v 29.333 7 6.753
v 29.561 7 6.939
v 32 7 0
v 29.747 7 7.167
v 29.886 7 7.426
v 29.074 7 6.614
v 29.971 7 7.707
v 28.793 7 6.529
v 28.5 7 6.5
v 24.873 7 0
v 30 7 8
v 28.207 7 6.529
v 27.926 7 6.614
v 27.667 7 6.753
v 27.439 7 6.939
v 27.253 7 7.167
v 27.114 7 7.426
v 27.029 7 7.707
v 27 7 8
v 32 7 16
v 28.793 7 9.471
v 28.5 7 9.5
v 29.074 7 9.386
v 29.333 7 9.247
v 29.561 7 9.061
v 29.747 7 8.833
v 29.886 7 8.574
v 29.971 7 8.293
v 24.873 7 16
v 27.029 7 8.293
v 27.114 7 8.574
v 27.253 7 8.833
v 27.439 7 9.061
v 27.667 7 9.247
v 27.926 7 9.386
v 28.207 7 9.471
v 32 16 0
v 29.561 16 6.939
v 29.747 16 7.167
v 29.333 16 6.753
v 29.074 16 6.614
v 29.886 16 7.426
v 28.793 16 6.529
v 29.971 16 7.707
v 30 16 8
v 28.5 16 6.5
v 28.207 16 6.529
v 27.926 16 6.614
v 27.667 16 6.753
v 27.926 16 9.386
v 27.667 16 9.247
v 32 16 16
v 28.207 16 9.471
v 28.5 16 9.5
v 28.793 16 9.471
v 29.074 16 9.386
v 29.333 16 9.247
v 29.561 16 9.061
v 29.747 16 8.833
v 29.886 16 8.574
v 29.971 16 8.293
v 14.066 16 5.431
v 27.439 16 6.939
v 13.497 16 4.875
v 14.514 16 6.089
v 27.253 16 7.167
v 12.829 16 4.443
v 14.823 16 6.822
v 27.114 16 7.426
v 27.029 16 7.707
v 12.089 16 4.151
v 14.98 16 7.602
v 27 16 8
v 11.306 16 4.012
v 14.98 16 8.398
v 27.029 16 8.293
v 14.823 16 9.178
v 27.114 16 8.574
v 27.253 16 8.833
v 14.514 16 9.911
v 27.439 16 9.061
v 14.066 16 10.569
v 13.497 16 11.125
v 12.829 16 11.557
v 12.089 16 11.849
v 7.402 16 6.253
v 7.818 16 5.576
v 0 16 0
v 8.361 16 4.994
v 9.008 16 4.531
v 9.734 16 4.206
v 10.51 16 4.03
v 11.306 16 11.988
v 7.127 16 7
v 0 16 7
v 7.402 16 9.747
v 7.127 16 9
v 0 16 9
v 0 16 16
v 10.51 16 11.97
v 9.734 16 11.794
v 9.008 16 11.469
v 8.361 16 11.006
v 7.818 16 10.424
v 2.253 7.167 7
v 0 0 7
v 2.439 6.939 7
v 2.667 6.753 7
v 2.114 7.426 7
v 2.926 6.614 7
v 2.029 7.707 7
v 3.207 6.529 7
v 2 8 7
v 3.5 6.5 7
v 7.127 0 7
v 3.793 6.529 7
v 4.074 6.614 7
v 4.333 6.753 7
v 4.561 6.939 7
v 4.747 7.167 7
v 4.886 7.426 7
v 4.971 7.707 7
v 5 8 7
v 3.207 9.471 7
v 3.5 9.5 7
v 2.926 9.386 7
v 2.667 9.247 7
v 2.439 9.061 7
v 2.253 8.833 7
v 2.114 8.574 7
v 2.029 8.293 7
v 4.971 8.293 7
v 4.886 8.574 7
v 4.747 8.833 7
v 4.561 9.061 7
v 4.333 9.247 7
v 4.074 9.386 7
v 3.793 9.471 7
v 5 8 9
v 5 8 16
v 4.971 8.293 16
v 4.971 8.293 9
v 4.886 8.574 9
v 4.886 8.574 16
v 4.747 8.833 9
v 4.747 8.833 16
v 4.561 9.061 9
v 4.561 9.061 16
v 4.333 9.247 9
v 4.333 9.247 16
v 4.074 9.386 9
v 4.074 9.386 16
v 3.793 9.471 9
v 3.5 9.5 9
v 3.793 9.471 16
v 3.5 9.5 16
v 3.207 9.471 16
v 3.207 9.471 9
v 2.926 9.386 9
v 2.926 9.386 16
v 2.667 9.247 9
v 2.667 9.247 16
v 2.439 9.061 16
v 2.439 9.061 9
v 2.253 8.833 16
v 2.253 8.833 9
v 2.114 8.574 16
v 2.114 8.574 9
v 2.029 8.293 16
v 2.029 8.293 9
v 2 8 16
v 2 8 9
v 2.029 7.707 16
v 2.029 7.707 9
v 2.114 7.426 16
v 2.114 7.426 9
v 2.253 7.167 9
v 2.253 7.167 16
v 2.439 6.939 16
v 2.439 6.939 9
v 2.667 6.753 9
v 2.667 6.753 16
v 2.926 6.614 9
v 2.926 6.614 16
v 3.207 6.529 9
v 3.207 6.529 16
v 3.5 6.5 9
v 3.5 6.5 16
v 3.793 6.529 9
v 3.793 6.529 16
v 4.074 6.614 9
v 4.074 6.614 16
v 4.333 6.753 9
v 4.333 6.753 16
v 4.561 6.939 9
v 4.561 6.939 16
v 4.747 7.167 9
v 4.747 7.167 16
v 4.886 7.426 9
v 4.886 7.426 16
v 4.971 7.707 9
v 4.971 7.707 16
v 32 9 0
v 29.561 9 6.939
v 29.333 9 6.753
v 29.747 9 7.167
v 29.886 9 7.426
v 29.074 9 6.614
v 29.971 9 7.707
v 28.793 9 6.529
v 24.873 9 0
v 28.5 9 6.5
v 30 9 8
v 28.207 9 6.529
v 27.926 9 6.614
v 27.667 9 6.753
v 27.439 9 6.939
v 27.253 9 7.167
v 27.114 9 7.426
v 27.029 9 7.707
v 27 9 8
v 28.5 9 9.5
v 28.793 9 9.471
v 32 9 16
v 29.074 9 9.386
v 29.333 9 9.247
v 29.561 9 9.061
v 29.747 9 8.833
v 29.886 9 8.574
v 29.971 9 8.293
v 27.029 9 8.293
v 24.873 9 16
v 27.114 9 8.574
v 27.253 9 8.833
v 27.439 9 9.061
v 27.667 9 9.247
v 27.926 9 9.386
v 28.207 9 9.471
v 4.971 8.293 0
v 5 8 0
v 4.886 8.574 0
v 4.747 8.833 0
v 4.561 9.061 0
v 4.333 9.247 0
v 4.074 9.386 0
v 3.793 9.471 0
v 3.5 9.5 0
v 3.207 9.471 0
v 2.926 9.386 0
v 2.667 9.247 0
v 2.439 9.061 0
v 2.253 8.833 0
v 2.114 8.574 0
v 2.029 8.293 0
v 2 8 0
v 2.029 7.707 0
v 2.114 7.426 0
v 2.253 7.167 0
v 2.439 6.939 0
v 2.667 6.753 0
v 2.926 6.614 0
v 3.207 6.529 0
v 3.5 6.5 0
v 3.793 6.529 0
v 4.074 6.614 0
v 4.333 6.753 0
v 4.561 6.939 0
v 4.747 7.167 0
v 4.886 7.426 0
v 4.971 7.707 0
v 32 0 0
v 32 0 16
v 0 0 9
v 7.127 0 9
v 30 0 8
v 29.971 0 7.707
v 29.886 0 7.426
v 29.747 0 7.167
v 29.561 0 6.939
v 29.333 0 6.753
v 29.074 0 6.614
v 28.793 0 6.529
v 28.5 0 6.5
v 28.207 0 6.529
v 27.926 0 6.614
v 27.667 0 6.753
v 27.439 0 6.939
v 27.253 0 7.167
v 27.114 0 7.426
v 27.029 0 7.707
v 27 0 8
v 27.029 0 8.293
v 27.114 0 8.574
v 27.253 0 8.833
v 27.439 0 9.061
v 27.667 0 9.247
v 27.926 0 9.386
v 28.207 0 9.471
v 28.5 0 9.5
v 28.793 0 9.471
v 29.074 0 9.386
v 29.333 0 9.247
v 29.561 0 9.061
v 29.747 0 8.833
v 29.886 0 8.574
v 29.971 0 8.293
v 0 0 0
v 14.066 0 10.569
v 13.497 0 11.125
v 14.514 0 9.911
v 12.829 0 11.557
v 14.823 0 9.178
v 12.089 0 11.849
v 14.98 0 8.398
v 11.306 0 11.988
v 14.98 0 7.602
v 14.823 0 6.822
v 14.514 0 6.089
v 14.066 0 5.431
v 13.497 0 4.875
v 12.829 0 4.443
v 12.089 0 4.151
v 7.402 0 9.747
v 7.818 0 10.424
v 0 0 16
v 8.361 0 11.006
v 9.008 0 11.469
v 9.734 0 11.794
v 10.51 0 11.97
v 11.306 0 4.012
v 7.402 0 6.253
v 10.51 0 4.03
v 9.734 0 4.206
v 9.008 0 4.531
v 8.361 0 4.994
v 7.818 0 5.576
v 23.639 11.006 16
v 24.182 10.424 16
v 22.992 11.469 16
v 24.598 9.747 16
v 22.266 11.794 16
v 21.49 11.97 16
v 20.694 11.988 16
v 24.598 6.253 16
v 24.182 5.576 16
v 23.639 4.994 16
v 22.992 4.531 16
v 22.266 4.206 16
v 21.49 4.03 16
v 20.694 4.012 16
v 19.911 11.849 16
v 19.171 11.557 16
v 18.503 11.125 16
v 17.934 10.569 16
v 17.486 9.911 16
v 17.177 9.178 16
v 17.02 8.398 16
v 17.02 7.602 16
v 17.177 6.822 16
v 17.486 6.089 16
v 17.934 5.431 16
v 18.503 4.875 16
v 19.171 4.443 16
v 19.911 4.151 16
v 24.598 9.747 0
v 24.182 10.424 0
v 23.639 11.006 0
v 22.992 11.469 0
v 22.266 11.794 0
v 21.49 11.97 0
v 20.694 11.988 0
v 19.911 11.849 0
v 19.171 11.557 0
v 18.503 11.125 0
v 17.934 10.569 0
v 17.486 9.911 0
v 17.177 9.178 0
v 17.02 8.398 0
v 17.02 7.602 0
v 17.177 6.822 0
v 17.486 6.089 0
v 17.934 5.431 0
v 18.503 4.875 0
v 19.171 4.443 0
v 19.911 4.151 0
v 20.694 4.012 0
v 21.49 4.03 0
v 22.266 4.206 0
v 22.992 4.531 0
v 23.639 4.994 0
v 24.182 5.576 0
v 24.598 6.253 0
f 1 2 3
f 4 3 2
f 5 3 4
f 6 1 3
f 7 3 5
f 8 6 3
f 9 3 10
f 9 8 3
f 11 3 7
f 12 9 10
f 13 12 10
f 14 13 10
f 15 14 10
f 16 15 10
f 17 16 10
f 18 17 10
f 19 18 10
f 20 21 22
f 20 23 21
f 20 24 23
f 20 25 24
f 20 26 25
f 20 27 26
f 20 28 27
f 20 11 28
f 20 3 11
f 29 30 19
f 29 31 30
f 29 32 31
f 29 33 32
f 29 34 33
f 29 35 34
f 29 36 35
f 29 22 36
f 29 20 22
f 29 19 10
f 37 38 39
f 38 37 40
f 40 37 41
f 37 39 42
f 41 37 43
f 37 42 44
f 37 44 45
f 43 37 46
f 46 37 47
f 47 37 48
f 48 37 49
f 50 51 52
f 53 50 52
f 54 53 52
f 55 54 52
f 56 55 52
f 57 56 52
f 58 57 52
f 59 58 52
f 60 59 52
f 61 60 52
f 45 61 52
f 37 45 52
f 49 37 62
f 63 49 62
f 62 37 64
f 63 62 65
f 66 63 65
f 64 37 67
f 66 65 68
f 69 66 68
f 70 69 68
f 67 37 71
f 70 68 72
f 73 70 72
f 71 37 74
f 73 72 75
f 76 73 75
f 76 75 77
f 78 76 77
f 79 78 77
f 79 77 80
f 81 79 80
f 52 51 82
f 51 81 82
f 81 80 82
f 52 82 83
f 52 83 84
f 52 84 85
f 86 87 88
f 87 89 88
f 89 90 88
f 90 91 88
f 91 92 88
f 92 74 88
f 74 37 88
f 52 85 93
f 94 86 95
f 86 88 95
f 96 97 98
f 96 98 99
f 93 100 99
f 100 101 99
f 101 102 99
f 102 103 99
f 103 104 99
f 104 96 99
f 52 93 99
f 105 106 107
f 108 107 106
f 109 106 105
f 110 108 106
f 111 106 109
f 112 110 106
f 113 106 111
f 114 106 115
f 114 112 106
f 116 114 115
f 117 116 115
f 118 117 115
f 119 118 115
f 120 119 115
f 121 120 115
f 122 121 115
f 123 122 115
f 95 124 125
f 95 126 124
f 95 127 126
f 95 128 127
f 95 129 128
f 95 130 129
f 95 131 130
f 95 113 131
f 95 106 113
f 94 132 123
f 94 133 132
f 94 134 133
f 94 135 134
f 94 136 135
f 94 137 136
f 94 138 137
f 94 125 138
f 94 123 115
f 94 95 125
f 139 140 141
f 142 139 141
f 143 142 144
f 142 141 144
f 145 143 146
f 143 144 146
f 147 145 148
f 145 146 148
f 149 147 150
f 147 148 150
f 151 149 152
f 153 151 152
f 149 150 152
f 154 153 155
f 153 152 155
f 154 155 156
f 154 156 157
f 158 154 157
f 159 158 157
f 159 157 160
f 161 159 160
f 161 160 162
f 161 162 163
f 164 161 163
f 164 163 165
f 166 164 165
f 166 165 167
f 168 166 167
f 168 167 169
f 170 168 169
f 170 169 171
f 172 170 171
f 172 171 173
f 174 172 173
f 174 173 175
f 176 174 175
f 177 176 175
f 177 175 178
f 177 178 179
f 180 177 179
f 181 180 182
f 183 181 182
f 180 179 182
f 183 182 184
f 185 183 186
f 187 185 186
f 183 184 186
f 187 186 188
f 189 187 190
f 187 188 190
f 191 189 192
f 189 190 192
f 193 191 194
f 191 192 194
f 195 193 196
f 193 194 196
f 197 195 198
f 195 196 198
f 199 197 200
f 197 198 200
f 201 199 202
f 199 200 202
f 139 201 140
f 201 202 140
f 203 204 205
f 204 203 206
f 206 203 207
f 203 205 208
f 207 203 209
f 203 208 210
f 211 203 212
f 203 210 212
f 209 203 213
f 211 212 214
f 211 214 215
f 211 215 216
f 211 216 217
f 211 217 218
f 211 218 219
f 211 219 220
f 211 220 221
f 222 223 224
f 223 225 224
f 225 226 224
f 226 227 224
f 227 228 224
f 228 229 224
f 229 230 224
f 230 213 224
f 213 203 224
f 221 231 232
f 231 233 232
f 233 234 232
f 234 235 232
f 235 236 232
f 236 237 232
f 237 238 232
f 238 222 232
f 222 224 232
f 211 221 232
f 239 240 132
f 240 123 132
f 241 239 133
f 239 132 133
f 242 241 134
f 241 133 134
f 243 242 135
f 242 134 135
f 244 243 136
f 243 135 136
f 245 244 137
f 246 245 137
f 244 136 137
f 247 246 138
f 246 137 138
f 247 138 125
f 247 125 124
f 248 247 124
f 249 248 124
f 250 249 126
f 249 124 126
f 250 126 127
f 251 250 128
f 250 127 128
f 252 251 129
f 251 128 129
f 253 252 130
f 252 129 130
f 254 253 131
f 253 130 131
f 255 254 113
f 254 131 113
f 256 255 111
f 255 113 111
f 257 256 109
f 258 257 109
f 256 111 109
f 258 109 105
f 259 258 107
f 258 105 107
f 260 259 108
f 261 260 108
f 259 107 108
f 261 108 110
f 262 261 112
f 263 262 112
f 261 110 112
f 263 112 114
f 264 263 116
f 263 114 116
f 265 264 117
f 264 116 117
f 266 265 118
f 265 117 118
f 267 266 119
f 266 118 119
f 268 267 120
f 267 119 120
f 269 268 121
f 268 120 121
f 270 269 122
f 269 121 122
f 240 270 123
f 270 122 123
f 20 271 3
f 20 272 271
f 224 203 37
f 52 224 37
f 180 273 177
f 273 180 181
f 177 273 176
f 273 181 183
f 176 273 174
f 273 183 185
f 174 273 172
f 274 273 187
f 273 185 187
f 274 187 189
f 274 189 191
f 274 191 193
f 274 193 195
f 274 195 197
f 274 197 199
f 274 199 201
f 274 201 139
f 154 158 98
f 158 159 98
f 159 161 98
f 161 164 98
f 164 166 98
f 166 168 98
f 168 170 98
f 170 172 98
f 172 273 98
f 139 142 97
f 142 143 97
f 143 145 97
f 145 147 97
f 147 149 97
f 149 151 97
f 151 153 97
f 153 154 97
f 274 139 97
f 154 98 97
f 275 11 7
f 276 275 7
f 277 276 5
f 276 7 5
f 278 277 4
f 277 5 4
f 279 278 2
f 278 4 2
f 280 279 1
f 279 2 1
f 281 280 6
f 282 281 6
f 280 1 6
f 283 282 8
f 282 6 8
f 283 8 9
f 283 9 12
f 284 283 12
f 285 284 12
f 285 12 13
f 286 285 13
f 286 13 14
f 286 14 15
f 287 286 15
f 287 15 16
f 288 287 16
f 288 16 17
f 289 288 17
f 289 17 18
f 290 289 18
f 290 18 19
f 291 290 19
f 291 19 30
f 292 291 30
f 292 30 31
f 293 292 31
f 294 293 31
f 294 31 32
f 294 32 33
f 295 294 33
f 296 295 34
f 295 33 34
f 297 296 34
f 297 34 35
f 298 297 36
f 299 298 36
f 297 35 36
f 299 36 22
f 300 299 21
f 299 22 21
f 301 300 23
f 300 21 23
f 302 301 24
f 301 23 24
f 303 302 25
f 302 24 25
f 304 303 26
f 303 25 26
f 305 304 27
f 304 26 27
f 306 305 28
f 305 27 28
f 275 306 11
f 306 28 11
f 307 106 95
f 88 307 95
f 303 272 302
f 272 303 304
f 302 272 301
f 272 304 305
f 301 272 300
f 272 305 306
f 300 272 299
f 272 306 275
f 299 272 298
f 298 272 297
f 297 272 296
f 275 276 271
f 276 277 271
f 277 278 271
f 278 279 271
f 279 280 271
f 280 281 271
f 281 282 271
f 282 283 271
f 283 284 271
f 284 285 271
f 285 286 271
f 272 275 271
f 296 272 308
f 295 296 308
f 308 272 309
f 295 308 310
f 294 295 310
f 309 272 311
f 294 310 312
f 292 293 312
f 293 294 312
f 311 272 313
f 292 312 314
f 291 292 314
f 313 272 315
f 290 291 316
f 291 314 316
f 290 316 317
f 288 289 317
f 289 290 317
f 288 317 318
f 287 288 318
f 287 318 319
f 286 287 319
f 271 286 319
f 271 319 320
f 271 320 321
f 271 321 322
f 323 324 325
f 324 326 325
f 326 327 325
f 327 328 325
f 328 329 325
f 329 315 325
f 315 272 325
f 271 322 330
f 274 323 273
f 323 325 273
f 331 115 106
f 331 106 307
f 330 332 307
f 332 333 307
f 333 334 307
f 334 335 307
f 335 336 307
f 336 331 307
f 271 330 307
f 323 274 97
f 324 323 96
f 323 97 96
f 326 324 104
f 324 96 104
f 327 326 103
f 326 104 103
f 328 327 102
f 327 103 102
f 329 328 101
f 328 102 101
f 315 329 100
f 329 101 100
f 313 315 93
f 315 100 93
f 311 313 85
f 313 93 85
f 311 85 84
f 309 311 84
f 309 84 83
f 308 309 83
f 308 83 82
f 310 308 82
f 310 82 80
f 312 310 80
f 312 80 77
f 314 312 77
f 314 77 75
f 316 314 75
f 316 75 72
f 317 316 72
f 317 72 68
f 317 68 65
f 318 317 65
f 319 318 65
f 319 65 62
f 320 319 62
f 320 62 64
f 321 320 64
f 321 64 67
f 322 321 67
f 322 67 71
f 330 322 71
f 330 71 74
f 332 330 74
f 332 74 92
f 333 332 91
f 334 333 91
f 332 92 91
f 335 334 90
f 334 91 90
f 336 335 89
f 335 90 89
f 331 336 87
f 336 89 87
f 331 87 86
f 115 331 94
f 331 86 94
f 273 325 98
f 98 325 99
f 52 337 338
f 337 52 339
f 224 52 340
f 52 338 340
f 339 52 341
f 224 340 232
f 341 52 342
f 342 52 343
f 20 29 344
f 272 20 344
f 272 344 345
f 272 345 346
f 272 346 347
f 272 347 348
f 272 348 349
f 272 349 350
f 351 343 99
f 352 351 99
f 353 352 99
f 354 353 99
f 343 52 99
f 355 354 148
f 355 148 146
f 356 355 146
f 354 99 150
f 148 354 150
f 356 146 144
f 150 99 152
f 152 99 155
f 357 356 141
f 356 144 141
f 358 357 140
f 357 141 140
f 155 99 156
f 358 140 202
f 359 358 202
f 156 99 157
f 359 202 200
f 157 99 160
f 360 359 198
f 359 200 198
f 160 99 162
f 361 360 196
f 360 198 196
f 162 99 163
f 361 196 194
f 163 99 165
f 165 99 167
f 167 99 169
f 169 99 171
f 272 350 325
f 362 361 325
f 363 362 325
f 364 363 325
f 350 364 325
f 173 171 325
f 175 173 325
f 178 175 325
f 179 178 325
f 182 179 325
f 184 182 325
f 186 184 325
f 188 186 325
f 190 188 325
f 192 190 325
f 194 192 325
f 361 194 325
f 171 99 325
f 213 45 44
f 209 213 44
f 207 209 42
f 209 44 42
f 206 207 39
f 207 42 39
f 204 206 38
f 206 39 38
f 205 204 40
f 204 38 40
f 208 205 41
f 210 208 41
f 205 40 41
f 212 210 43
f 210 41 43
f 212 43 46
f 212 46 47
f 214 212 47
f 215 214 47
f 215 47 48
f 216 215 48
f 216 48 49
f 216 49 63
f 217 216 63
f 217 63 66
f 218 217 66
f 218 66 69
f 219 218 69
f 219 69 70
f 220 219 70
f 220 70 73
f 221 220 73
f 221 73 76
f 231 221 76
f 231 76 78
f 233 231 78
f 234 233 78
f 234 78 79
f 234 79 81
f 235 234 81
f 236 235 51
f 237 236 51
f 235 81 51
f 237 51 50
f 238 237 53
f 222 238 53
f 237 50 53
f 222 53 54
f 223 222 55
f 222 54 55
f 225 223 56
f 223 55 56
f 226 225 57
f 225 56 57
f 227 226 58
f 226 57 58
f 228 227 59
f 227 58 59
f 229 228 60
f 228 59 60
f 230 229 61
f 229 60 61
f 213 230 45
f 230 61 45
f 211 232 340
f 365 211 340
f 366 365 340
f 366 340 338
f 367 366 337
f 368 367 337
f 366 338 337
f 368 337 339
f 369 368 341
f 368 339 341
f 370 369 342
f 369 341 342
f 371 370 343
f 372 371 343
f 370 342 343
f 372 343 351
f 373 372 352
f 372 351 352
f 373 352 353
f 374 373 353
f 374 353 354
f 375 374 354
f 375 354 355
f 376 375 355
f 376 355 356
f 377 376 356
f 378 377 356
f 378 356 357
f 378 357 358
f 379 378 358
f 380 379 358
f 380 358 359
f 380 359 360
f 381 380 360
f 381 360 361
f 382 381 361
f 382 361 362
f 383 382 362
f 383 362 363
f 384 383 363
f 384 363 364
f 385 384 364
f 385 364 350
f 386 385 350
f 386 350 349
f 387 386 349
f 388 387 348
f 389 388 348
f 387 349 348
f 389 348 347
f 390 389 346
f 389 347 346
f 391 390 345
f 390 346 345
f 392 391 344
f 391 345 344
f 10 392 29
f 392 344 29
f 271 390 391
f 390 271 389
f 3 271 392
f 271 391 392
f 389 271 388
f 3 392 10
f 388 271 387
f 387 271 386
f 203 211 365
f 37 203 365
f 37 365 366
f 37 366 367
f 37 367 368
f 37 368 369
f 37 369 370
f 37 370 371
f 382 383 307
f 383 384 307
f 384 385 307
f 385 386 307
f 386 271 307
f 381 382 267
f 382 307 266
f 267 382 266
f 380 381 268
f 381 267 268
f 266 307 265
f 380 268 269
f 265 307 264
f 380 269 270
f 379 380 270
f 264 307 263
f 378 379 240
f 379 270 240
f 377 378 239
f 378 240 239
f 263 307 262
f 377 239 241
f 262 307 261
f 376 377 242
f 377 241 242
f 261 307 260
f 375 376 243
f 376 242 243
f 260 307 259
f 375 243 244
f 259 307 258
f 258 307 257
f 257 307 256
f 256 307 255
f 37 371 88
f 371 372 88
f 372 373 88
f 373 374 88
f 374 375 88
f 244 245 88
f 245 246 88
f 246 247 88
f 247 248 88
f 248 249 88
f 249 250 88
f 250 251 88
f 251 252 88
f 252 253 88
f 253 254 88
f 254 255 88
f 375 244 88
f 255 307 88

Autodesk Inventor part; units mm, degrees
ref_plane "YZ Plane" through (0, 0, 0) normal (1, 0, 0) x (0, 1, 0)
ref_plane "XZ Plane" through (0, 0, 0) normal (0, 1, 0) x (-1, 0, 0)
ref_plane "XY Plane" through (0, 0, 0) normal (0, 0, 1) x (1, 0, 0)
sketch "Sketch1" plane through (0, 0, 0) normal (1, 0, 0) x (0, 1, 0)
  line L0 (0, 0) -> (16, 0)
  line L1 (16, 0) -> (16, 16)
  line L2 (16, 16) -> (0, 16)
  line L3 (0, 16) -> (0, 0)
  dimension "d0" = 16
  dimension "d1" = 16
extrude "Extrusion1" add sketch "Sketch1" along normal blind 32
sketch "Sketch2" plane through (0, 0, 16) normal (0, 0, 1) x (1, 0, 0)
  line L0 (32, 16) -> (32, 0) projected
  circle A0 centre (21, 8) radius 4
  line L1 (32, 8) -> (32, 9)
  line L2 (32, 9) -> (32, 7)
  line L3 (32, 7) -> (24.873, 7)
  line L4 (32, 9) -> (24.873, 9)
  circle A1 centre (3.5, 8) radius 1.5
  dimension "d5" = 8
  dimension "d6" = 1
  dimension "d7" = 2
  dimension "d9" = 3
extrude "Extrusion2" cut sketch "Sketch2" against normal blind 32
sketch "Sketch3" plane through (0, 16, 16) normal (0, 1, 0) x (1, 0, 0)
  line L0 (0, 16) -> (0, 0) projected
  line L1 (0, 0) -> (32, 0) projected
  line L2 (32, 16) -> (32, 0) projected
  line L3 (0, 16) -> (32, 16) projected
  line L4 (16, 16) -> (16, 0)
  line L5 (16, 8) -> (11, 8)
  circle A0 centre (11, 8) radius 4
  line L6 (0, 8) -> (0, 9)
  line L7 (0, 9) -> (7.127, 9)
  line L8 (0, 8) -> (0, 7)
  line L9 (0, 7) -> (7.127, 7)
  line L10 (32, 8) -> (28.5, 8)
  circle A1 centre (28.5, 8) radius 1.5
  dimension "d12" = 5
  dimension "d13" = 8
  dimension "d14" = 1
  dimension "d15" = 1
  dimension "d16" = 3.5
  dimension "d17" = 3
extrude "Extrusion3" cut sketch "Sketch3" against normal blind 32 contours L7 A0 L9 L0 | A1 | A0
properties part number "BarClamp_V2" material "Birch"
